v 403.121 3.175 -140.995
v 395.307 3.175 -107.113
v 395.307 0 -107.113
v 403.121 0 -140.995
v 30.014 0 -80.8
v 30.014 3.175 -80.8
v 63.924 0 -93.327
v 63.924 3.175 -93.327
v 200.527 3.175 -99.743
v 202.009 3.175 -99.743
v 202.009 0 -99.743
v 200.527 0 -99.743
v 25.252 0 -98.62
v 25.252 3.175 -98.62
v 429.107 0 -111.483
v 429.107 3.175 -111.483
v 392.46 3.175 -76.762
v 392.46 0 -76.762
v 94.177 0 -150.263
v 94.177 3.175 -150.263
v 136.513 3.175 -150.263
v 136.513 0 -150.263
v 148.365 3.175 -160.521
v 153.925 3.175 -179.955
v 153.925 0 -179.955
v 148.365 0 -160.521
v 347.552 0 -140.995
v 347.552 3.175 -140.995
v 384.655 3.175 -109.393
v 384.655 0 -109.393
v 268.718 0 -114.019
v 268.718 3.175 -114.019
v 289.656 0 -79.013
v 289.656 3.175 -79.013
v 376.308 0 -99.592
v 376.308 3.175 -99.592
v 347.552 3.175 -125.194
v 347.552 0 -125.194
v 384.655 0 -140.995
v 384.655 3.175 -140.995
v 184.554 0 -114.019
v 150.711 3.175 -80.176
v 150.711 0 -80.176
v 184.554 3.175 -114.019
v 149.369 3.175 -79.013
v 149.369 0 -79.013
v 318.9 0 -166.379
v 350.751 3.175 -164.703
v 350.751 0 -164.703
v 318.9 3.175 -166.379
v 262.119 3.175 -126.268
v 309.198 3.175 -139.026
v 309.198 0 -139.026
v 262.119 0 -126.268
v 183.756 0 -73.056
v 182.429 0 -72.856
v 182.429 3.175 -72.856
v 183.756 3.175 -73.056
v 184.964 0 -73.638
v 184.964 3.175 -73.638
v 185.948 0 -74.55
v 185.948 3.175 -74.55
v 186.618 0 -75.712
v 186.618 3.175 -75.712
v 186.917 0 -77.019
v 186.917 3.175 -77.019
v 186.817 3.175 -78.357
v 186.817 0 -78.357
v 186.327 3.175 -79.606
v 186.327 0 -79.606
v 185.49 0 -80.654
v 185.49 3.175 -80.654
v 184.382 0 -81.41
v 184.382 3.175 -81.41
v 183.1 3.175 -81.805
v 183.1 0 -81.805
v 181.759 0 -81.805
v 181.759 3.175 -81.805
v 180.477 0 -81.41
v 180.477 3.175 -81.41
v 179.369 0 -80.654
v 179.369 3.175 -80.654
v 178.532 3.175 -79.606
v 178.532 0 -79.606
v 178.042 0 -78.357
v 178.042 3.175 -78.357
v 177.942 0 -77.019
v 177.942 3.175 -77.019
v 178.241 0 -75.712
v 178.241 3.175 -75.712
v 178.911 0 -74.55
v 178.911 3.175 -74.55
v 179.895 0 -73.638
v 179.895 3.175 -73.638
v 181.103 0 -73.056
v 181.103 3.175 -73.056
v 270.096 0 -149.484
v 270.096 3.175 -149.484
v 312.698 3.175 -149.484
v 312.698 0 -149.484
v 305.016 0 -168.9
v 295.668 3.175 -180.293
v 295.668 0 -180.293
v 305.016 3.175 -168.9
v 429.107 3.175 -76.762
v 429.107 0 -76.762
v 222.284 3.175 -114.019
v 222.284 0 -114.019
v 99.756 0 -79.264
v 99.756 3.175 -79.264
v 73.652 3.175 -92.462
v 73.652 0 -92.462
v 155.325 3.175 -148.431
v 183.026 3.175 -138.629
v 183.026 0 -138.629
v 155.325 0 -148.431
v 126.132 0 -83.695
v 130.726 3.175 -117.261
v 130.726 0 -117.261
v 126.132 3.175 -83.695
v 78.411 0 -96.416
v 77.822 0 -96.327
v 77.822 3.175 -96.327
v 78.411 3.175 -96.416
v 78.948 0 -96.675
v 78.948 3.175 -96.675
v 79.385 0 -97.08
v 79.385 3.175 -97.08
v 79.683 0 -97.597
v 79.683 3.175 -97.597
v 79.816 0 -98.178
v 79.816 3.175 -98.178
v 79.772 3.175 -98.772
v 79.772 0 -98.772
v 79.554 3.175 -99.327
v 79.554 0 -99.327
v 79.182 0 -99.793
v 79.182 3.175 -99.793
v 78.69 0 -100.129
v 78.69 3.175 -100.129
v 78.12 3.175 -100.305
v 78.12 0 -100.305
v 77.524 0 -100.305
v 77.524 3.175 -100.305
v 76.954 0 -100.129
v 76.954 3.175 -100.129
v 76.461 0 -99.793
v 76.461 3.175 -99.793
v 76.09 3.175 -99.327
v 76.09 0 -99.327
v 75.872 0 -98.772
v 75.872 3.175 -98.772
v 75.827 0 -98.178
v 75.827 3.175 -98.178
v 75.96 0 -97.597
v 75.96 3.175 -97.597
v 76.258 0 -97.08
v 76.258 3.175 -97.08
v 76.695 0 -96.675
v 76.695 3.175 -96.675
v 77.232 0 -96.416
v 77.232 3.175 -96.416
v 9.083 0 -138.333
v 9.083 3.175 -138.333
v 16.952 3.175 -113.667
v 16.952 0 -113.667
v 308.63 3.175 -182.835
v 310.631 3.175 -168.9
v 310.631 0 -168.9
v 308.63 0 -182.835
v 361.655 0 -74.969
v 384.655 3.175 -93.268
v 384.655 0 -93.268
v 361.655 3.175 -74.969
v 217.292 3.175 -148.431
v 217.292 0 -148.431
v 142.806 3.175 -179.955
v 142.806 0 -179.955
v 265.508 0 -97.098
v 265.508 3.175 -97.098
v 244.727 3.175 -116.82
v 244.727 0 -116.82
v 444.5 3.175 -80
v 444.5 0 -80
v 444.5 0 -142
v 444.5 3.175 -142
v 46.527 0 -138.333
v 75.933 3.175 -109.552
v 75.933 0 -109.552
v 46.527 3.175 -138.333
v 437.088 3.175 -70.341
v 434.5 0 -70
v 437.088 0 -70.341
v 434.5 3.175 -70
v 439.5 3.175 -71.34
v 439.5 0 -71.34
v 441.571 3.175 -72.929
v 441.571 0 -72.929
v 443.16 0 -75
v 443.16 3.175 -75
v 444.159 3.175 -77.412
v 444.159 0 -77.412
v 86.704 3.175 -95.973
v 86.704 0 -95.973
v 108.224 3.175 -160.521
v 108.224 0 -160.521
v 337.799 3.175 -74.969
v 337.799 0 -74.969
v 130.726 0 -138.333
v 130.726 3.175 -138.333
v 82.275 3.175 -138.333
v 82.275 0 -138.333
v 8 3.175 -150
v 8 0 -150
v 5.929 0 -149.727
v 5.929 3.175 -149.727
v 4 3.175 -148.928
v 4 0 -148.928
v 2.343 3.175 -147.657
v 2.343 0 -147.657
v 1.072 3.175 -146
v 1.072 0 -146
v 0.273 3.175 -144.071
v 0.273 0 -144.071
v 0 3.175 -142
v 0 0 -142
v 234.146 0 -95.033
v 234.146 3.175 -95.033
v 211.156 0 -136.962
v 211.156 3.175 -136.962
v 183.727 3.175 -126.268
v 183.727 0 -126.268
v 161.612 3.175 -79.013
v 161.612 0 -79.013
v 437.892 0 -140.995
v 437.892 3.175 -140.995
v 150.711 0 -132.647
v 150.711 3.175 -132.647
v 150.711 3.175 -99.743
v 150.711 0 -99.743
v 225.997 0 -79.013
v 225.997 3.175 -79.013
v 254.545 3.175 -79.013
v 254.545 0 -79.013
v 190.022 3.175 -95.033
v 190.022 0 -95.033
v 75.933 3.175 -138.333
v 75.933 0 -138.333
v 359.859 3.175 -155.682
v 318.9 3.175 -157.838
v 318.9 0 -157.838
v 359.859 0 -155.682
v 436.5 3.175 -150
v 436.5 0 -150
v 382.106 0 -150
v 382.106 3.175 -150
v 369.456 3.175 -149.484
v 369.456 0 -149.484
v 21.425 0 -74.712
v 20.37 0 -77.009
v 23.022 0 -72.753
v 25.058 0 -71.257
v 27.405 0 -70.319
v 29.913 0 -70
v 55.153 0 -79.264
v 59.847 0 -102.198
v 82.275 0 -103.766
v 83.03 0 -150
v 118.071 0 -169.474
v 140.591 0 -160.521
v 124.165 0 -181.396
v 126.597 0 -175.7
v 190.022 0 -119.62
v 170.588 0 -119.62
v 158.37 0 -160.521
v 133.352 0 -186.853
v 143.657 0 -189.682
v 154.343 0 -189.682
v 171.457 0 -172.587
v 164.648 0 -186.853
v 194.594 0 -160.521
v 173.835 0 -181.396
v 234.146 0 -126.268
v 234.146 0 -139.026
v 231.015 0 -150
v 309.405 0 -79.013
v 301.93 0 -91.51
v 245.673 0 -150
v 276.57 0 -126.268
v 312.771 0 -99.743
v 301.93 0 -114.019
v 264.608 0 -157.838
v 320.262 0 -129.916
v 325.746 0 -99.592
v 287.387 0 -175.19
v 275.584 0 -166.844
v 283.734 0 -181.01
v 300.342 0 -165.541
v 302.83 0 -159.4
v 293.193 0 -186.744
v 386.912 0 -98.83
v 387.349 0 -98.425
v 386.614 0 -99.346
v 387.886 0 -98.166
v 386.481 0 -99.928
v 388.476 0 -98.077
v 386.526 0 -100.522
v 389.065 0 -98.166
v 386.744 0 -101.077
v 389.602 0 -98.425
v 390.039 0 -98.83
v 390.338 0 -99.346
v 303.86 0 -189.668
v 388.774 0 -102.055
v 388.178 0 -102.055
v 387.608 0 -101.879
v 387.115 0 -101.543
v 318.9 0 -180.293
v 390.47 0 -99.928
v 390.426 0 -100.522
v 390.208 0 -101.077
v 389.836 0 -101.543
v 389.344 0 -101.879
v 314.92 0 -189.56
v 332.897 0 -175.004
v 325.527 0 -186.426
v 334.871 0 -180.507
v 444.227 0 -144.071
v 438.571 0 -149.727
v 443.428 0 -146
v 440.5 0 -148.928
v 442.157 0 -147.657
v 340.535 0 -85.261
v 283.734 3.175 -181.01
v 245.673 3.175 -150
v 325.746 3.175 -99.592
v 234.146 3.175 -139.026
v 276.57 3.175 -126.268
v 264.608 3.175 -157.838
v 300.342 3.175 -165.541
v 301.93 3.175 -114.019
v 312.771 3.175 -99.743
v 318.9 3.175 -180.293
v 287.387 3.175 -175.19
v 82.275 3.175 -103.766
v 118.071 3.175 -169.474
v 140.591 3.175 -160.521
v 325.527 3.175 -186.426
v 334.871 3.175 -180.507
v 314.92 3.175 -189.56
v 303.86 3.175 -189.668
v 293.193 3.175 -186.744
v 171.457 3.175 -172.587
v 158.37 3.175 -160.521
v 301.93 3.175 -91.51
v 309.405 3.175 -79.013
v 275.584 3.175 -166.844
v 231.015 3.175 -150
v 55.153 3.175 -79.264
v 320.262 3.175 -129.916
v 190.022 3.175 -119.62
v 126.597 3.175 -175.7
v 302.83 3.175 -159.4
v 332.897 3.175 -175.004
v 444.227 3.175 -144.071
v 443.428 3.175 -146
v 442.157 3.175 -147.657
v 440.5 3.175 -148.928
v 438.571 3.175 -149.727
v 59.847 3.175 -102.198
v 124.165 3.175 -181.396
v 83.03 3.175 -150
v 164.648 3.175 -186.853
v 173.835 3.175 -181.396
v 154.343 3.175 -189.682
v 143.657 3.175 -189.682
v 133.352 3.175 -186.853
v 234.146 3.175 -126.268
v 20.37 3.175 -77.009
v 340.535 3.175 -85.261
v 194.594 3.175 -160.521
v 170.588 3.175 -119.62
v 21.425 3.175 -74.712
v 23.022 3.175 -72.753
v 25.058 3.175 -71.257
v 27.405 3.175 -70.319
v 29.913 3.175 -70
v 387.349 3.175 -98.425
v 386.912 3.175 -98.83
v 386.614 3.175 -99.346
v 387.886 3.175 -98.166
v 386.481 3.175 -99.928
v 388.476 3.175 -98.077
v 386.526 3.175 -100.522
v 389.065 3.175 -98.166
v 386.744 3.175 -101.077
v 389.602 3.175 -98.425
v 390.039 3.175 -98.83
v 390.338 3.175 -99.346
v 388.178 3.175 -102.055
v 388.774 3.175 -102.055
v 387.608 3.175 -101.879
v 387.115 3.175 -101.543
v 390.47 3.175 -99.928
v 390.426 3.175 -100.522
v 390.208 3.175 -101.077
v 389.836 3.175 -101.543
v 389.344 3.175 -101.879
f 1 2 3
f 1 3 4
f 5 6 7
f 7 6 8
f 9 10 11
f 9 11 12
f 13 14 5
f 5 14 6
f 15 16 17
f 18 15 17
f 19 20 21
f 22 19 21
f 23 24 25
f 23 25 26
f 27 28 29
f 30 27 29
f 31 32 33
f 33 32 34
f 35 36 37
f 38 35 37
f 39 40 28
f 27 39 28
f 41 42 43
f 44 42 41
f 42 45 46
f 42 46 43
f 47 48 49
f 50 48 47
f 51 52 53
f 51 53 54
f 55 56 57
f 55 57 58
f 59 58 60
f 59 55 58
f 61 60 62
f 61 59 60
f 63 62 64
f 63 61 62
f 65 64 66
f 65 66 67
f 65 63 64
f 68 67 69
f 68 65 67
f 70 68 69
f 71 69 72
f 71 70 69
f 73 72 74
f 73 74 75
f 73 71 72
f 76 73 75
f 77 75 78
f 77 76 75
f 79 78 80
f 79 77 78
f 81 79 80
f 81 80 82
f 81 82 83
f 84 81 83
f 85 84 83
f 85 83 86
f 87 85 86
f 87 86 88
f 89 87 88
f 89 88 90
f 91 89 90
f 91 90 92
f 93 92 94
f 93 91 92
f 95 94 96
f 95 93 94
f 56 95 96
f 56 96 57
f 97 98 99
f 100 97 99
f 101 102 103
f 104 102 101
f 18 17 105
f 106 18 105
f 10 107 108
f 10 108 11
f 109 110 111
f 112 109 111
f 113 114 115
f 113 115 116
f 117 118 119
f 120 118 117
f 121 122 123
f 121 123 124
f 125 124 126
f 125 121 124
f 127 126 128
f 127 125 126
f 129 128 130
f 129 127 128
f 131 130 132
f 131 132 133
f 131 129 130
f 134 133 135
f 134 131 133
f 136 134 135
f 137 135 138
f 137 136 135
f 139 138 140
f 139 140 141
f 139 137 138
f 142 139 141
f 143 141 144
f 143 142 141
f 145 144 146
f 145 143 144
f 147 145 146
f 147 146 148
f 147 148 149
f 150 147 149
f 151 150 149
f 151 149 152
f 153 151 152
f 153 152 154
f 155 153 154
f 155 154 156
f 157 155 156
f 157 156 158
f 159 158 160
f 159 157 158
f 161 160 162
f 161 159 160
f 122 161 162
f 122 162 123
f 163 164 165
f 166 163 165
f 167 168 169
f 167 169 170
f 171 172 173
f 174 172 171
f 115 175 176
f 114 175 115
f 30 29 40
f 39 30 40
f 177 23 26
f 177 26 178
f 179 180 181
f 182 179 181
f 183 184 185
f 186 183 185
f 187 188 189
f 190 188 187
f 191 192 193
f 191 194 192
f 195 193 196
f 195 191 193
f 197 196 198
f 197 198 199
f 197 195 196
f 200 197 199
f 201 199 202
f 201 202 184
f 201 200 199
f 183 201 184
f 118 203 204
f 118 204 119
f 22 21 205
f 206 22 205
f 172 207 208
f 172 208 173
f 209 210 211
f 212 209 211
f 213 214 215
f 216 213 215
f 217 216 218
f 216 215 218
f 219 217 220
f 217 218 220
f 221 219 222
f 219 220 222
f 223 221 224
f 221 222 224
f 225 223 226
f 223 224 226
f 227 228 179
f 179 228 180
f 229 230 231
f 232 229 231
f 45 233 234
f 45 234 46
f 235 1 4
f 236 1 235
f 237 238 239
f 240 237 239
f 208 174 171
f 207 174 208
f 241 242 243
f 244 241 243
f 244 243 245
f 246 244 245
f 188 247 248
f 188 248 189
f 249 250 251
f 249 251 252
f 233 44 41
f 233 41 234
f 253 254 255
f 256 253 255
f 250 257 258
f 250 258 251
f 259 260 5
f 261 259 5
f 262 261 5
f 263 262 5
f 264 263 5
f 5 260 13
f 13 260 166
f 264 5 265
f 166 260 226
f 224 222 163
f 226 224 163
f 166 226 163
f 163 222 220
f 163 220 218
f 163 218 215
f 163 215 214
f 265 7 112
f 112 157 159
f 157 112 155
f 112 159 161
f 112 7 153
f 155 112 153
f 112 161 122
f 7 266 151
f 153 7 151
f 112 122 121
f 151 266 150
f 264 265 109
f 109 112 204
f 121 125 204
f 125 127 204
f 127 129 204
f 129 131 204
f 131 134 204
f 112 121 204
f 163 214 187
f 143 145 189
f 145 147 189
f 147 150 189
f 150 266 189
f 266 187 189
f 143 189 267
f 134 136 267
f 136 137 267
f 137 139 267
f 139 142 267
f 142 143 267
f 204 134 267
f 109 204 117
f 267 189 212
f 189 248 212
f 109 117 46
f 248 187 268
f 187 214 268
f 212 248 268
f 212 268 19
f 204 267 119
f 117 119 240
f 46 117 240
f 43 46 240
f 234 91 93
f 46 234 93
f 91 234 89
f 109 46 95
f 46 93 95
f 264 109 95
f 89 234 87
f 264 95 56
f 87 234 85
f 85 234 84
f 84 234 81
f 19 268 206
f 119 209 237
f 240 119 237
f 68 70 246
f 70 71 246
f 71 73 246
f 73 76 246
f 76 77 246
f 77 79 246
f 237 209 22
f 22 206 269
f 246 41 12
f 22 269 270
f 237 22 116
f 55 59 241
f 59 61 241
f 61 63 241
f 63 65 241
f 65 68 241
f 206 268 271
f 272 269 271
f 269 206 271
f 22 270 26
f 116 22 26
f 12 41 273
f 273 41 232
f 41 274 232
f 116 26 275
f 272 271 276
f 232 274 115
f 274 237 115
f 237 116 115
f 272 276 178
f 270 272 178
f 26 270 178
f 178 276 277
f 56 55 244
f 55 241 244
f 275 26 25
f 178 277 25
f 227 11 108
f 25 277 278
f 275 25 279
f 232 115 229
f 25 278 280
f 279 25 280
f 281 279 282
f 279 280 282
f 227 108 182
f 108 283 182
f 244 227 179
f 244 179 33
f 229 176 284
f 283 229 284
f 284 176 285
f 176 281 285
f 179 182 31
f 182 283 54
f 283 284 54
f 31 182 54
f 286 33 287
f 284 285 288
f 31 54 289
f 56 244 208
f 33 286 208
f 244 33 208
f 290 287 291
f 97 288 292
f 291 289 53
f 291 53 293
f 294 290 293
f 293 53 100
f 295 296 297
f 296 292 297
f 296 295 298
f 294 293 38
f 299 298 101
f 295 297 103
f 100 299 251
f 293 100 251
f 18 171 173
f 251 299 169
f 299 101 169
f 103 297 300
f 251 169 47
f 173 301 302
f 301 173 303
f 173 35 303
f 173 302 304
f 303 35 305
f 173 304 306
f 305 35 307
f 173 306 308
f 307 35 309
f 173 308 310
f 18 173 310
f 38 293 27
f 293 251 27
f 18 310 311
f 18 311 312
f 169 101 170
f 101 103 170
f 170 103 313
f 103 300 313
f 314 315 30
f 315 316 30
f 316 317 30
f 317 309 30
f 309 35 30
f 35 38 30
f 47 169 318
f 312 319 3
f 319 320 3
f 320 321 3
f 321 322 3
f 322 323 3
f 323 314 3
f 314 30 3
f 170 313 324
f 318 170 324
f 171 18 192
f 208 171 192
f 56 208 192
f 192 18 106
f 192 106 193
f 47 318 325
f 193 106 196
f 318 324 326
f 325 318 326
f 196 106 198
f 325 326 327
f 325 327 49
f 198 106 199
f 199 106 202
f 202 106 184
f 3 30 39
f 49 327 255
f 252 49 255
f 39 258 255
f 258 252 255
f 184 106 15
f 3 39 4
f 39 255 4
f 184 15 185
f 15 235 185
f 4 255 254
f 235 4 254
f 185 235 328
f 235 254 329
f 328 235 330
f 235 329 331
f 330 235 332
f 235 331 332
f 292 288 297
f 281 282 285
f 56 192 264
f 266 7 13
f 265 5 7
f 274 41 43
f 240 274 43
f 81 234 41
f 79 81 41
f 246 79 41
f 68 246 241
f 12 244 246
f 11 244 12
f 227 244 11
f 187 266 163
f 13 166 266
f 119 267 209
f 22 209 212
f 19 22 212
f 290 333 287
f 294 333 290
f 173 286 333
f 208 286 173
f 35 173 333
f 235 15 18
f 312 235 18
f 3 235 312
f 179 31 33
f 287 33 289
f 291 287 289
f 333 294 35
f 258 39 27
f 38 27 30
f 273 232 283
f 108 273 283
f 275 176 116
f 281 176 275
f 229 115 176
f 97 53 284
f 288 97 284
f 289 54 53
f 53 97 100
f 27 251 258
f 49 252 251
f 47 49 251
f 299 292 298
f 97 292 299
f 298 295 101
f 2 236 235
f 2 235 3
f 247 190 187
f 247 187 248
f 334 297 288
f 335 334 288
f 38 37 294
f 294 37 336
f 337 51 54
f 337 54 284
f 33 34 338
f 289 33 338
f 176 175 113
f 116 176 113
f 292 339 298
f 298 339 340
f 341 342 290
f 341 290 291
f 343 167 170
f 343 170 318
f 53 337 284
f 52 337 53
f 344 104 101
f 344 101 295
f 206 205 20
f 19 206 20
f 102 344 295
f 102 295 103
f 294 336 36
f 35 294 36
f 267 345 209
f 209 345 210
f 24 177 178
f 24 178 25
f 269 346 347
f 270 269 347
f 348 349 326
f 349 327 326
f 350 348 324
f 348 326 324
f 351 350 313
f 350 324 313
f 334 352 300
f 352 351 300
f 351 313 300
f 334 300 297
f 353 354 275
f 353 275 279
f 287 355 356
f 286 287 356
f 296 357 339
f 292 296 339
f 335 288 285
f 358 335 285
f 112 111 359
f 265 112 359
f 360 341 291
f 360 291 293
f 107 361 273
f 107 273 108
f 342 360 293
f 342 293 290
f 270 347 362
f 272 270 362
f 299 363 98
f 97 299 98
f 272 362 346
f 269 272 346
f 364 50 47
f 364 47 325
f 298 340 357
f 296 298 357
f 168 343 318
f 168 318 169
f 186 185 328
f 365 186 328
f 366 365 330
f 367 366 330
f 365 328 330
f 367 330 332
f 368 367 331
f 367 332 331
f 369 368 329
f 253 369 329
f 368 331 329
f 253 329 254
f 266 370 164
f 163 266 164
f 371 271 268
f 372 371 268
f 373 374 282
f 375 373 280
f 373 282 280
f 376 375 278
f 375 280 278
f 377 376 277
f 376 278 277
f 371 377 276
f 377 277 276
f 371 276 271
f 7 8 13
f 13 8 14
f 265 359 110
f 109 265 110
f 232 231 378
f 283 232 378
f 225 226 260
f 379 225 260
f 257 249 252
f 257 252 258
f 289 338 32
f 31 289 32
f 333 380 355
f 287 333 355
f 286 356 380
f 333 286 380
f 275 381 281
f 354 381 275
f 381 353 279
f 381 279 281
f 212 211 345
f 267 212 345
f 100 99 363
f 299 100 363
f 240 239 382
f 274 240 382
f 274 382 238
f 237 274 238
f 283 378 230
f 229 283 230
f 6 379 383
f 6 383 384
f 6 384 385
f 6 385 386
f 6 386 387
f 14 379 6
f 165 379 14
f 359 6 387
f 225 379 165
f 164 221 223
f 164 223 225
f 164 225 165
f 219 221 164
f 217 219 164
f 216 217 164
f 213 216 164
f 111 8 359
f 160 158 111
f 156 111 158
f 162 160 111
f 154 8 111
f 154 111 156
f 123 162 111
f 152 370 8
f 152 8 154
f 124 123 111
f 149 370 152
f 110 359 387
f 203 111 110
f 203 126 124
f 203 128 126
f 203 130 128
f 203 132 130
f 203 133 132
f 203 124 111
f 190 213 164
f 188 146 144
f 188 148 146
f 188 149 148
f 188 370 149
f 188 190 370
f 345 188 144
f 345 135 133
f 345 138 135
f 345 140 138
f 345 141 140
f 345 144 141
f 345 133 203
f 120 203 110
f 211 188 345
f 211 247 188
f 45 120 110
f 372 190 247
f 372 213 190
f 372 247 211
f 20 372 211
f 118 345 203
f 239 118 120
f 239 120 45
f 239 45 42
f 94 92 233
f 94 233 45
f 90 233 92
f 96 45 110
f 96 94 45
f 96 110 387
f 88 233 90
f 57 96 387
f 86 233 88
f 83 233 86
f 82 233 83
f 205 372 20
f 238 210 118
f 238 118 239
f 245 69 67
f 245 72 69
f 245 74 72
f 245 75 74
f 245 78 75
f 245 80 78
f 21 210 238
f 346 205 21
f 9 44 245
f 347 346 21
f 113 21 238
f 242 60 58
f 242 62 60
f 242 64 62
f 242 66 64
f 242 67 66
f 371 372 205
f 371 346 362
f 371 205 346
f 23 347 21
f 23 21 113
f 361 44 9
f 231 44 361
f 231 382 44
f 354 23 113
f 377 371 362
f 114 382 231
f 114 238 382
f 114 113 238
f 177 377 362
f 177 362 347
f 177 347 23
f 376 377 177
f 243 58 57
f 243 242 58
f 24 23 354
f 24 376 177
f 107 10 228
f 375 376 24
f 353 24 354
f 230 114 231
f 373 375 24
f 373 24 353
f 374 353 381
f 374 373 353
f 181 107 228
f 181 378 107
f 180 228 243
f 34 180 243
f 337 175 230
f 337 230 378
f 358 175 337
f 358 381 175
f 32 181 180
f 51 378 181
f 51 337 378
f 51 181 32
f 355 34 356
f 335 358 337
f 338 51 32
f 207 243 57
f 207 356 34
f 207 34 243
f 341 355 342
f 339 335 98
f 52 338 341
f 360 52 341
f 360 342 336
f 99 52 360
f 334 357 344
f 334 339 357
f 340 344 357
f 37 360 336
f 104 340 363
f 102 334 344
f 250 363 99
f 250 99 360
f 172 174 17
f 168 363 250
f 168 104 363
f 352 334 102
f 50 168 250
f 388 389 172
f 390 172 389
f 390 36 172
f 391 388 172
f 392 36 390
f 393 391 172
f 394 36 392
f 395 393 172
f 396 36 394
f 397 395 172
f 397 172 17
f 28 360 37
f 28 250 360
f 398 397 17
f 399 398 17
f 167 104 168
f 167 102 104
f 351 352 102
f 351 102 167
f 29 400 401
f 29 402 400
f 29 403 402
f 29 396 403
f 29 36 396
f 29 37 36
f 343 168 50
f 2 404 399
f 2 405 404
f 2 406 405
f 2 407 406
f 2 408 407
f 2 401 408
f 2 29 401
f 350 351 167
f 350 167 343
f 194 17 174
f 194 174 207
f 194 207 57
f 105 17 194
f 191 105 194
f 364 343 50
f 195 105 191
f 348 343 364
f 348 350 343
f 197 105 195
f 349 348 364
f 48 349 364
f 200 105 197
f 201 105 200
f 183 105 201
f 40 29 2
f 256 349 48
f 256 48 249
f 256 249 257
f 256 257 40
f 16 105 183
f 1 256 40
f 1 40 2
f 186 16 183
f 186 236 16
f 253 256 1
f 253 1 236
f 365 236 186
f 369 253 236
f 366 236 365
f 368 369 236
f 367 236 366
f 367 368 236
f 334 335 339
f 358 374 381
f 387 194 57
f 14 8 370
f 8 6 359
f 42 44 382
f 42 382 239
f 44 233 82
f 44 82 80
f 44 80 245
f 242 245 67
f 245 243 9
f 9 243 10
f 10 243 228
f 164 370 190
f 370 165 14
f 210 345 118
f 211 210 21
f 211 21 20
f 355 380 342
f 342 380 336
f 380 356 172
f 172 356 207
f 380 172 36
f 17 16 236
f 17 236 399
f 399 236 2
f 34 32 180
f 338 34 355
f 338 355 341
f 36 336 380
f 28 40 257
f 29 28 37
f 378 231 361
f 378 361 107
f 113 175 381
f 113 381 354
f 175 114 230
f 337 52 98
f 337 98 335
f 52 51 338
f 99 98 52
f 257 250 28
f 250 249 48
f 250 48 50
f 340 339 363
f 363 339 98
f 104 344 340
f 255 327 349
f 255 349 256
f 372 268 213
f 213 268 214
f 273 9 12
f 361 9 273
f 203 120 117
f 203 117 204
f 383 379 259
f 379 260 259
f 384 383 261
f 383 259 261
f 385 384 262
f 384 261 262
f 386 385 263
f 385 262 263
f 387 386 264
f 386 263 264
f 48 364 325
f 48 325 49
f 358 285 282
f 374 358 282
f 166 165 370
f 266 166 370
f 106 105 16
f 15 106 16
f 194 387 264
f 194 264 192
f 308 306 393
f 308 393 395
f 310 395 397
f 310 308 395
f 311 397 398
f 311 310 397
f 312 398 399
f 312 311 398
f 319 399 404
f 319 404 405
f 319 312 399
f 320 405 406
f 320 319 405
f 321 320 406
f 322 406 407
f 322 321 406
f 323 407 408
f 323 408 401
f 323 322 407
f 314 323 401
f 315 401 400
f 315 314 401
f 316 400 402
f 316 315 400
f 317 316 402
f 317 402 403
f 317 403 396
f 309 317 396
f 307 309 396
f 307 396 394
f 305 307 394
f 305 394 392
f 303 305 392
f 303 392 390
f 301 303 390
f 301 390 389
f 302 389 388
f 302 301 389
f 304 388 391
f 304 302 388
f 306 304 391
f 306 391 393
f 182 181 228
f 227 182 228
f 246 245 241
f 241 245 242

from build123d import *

# Parameters (mm, degrees)
SKETCH1_R           = 2
SKETCH1_R_2         = 4.313560469
SKETCH1_R_3         = 4.5
SKETCH1_R_4         = 3.716178426
BOSS_EXTRUDE1_DEPTH = 3.175
SKETCH2_W           = 597.466303312
SKETCH2_H           = 60.972543052
CUT_EXTRUDE1_DEPTH  = 70
FILLET1_R           = 10
FILLET2_R           = 10
SKETCH6_R           = 40
BOSS_EXTRUDE2_DEPTH = 3.175
BOSS_EXTRUDE3_DEPTH = 3.175
SKETCH9_R           = 40
BOSS_EXTRUDE4_DEPTH = 3.175
BOSS_EXTRUDE6_DEPTH = 3.175
CUT_EXTRUDE2_DEPTH  = 10
CUT_EXTRUDE3_DEPTH  = 10
CUT_EXTRUDE4_DEPTH  = 10
CUT_EXTRUDE5_DEPTH  = 10
CUT_EXTRUDE6_DEPTH  = 10


with BuildPart() as part:
    # Sketch1 → Boss-Extrude1 (new body)
    with BuildSketch(Plane(origin=(0, 0, 0), x_dir=(1, 0, 0), z_dir=(0, 1, 0))):
        with BuildLine():
            ThreePointArc((8, 150), (2.343145751, 147.656854249), (0, 142))
            Line((0, 142), (42, 8))
            ThreePointArc((42, 8), (44.343145751, 2.343145751), (50, 0))
            Line((50, 0), (436.5, 0))
            ThreePointArc((436.5, 0), (442.156854249, 2.343145751), (444.5, 8))
            Line((444.5, 8), (444.5, 142))
            ThreePointArc((444.5, 142), (442.156854249, 147.656854249), (436.5, 150))
            Line((436.5, 150), (336.748623665, 150))
            ThreePointArc((336.748623665, 150), (334.106475607, 148.038018595), (331.46432755, 150))
            Line((331.46432755, 150), (8, 150))
        make_face()
        with Locations(Location((388.475756445, 100.077126905, 0), (0, 0, 270))):
            Circle(SKETCH1_R, mode=Mode.SUBTRACT)
        with Locations(Location((307.606475607, 140.710564477, 0), (0, 0, 270))):
            Circle(SKETCH1_R_2, mode=Mode.SUBTRACT)
        with Locations(Location((77.821750814, 98.327219393, 0), (0, 0, 270))):
            Circle(SKETCH1_R, mode=Mode.SUBTRACT)
        with Locations(Location((182.429479385, 77.355745695, 0), (0, 0, 270))):
            Circle(SKETCH1_R_3, mode=Mode.SUBTRACT)
        with Locations(Location((146.269370224, 139.84039861, 0), (0, 0, 270))):
            Circle(SKETCH1_R_4, mode=Mode.SUBTRACT)
    extrude(amount=BOSS_EXTRUDE1_DEPTH)

    # Sketch2 → Cut-Extrude1 (cut)
    with BuildSketch(Plane.XY):
        with Locations((220.1785332, 7.544358636)):
            Rectangle(SKETCH2_W, SKETCH2_H)
    extrude(amount=-CUT_EXTRUDE1_DEPTH, mode=Mode.SUBTRACT)

    # Fillet1
    fillet1_edges = [part.edges().sort_by_distance(p)[0] for p in [
        (22.567164179, 1.5875, -70),
    ]]
    fillet(fillet1_edges, radius=FILLET1_R)

    # Fillet2
    fillet2_edges = [part.edges().sort_by_distance(p)[0] for p in [
        (444.5, 1.5875, -70),
    ]]
    fillet(fillet2_edges, radius=FILLET2_R)

    # Sketch6 → Boss-Extrude2 (add)
    with BuildSketch(Plane(origin=(0, 0, 0), x_dir=(1, 0, 0), z_dir=(0, 1, 0))):
        with Locations((149, 150.04039861)):
            Circle(SKETCH6_R)
    extrude(amount=BOSS_EXTRUDE2_DEPTH)

    # Sketch7 → Boss-Extrude3 (add)
    with BuildSketch(Plane(origin=(0, 0, 0), x_dir=(1, 0, 0), z_dir=(0, 1, 0))):
        Polygon((124.164543783, 181.396420591), (82.702881078, 149.750534228), (231.468946681, 149.750534228), (173.835456217, 181.396420591), align=None)
    extrude(amount=BOSS_EXTRUDE3_DEPTH)

    # Sketch9 → Boss-Extrude4 (add)
    with BuildSketch(Plane(origin=(0, 0, 0), x_dir=(1, 0, 0), z_dir=(0, 1, 0))):
        with BuildLine():
            ThreePointArc((269, 150), (272.870833001, 167.166341835), (283.734164599, 181.010281545))
            Line((283.734164599, 181.010281545), (245.673378314, 150))
            Line((245.673378314, 150), (269, 150))
        make_face()
        with Locations((309, 150)):
            Circle(SKETCH9_R)
    extrude(amount=BOSS_EXTRUDE4_DEPTH)

    # Sketch12 → Boss-Extrude6 (add)
    with BuildSketch(Plane(origin=(0, 0, 0), x_dir=(1, 0, 0), z_dir=(0, 1, 0))):
        Polygon((326.166341835, 186.129166999), (382.106475607, 150), (340.398839744, 150), align=None)
    extrude(amount=BOSS_EXTRUDE6_DEPTH)

    # Sketch13 → Cut-Extrude2 (cut)
    with BuildSketch(Plane(origin=(0, 3.175, 0), x_dir=(1, 0, 0), z_dir=(0, 1, 0))):
        Polygon((126.596630185, 175.699600472), (118.071388699, 169.473803102), (140.590780828, 160.520909874), align=None)
        Polygon((142.805778665, 179.955358976), (153.92453015, 179.955358976), (148.365154407, 160.520909874), align=None)
        Polygon((158.369799386, 160.520909874), (171.45690463, 172.586701787), (194.594159282, 160.520909874), align=None)
        Polygon((108.223756098, 160.520909874), (94.177153866, 150.262983529), (136.512601507, 150.262983529), align=None)
        Polygon((155.324532982, 148.431005589), (192.465847063, 148.431005589), (217.292214981, 148.431005589), (183.025531956, 138.62875365), align=None)
    extrude(amount=-CUT_EXTRUDE2_DEPTH, mode=Mode.SUBTRACT)

    # Sketch14 → Cut-Extrude3 (cut)
    with BuildSketch(Plane(origin=(0, 3.175, 0), x_dir=(1, 0, 0), z_dir=(0, 1, 0))):
        Polygon((287.387365491, 175.190284075), (295.66806948, 180.292754759), (305.015851869, 168.900328202), align=None)
        Polygon((308.630084677, 182.834690248), (318.900148429, 180.292754759), (310.630809682, 168.900328202), align=None)
        Polygon((318.900148429, 166.379196716), (332.89720101, 175.004012981), (350.750845105, 164.702889414), align=None)
        Polygon((300.341960675, 165.541043065), (275.583975015, 166.844059842), (264.607664644, 157.837711611), align=None)
        Polygon((318.900148429, 157.837711611), (359.859445758, 155.682017188), (369.45606502, 149.484000906), align=None)
        Polygon((302.829713803, 159.399721535), (270.095819829, 149.484000906), (312.697737902, 149.484000906), align=None)
    extrude(amount=-CUT_EXTRUDE3_DEPTH, mode=Mode.SUBTRACT)

    # Sketch15 → Cut-Extrude4 (cut)
    with BuildSketch(Plane(origin=(0, 3.175, 0), x_dir=(1, 0, 0), z_dir=(0, 1, 0))):
        Polygon((9.082536395, 138.332869462), (16.951784082, 113.666673792), (59.847245845, 102.198186546), align=None)
        Polygon((46.527345648, 138.332869462), (75.932780446, 138.332869462), (75.932780446, 109.552219535), align=None)
        Polygon((82.275228769, 103.765733182), (130.726352108, 138.332869462), (82.275228769, 138.332869462), align=None)
        Polygon((25.252080853, 98.620149784), (30.014206453, 80.800449194), (63.923719137, 93.326510285), align=None)
        Polygon((73.651734719, 92.462114854), (55.153094423, 79.264381219), (99.755557686, 79.264381219), align=None)
        Polygon((86.703646203, 95.973330035), (130.726352108, 117.260863799), (126.131589339, 83.694731493), align=None)
    extrude(amount=-CUT_EXTRUDE4_DEPTH, mode=Mode.SUBTRACT)

    # Sketch16 → Cut-Extrude5 (cut)
    with BuildSketch(Plane(origin=(0, 3.175, 0), x_dir=(1, 0, 0), z_dir=(0, 1, 0))):
        Polygon((437.892195527, 140.994591207), (395.306902067, 107.113261781), (403.121369003, 140.994591207), align=None)
        Polygon((384.654839472, 93.268223937), (361.655164528, 74.969428739), (337.798732838, 74.969428739), align=None)
        Polygon((429.106942721, 111.483374831), (392.46021732, 76.762265555), (429.106942721, 76.762265555), align=None)
        Polygon((384.654839472, 140.994591207), (347.551515413, 140.994591207), (384.654839472, 109.39285335), align=None)
        Polygon((347.551515413, 125.193722279), (325.746359439, 99.592479337), (376.307639908, 99.592479337), align=None)
    extrude(amount=-CUT_EXTRUDE5_DEPTH, mode=Mode.SUBTRACT)

    # Sketch17 → Cut-Extrude6 (cut)
    with BuildSketch(Plane(origin=(0, 3.175, 0), x_dir=(1, 0, 0), z_dir=(0, 1, 0))):
        Polygon((234.14639503, 139.026116815), (309.197820801, 139.026116815), (262.118798526, 126.26771918), align=None)
        Polygon((211.155668978, 136.962371774), (183.727319265, 126.26771918), (234.14639503, 126.26771918), align=None)
        Polygon((150.710604994, 132.646917997), (150.710604994, 99.742633834), (170.588020135, 119.620048974), align=None)
        Polygon((150.710604994, 80.176001915), (184.553616381, 114.019013303), (161.611869132, 79.012701862), (149.369026486, 79.012701862), align=None)
        Polygon((190.022281375, 95.03260673), (225.996651018, 79.012701862), (254.545180422, 79.012701862), align=None)
        Polygon((200.527414873, 99.742633834), (190.022281375, 119.620048974), (222.283730898, 114.019013303), (202.008756576, 99.742633834), align=None)
        Polygon((244.72715064, 116.819531138), (234.14639503, 95.03260673), (265.507593925, 97.097507609), align=None)
        Polygon((268.717573549, 114.019013303), (289.655742431, 79.012701862), (276.569858899, 126.26771918), align=None)
        Polygon((301.929754413, 114.019013303), (320.262459356, 129.915538559), (312.771055987, 99.742633834), align=None)
        Polygon((301.929754413, 91.509886863), (309.404639922, 79.012701862), (340.535394318, 85.261294363), align=None)
    extrude(amount=-CUT_EXTRUDE6_DEPTH, mode=Mode.SUBTRACT)


solid = part.part
